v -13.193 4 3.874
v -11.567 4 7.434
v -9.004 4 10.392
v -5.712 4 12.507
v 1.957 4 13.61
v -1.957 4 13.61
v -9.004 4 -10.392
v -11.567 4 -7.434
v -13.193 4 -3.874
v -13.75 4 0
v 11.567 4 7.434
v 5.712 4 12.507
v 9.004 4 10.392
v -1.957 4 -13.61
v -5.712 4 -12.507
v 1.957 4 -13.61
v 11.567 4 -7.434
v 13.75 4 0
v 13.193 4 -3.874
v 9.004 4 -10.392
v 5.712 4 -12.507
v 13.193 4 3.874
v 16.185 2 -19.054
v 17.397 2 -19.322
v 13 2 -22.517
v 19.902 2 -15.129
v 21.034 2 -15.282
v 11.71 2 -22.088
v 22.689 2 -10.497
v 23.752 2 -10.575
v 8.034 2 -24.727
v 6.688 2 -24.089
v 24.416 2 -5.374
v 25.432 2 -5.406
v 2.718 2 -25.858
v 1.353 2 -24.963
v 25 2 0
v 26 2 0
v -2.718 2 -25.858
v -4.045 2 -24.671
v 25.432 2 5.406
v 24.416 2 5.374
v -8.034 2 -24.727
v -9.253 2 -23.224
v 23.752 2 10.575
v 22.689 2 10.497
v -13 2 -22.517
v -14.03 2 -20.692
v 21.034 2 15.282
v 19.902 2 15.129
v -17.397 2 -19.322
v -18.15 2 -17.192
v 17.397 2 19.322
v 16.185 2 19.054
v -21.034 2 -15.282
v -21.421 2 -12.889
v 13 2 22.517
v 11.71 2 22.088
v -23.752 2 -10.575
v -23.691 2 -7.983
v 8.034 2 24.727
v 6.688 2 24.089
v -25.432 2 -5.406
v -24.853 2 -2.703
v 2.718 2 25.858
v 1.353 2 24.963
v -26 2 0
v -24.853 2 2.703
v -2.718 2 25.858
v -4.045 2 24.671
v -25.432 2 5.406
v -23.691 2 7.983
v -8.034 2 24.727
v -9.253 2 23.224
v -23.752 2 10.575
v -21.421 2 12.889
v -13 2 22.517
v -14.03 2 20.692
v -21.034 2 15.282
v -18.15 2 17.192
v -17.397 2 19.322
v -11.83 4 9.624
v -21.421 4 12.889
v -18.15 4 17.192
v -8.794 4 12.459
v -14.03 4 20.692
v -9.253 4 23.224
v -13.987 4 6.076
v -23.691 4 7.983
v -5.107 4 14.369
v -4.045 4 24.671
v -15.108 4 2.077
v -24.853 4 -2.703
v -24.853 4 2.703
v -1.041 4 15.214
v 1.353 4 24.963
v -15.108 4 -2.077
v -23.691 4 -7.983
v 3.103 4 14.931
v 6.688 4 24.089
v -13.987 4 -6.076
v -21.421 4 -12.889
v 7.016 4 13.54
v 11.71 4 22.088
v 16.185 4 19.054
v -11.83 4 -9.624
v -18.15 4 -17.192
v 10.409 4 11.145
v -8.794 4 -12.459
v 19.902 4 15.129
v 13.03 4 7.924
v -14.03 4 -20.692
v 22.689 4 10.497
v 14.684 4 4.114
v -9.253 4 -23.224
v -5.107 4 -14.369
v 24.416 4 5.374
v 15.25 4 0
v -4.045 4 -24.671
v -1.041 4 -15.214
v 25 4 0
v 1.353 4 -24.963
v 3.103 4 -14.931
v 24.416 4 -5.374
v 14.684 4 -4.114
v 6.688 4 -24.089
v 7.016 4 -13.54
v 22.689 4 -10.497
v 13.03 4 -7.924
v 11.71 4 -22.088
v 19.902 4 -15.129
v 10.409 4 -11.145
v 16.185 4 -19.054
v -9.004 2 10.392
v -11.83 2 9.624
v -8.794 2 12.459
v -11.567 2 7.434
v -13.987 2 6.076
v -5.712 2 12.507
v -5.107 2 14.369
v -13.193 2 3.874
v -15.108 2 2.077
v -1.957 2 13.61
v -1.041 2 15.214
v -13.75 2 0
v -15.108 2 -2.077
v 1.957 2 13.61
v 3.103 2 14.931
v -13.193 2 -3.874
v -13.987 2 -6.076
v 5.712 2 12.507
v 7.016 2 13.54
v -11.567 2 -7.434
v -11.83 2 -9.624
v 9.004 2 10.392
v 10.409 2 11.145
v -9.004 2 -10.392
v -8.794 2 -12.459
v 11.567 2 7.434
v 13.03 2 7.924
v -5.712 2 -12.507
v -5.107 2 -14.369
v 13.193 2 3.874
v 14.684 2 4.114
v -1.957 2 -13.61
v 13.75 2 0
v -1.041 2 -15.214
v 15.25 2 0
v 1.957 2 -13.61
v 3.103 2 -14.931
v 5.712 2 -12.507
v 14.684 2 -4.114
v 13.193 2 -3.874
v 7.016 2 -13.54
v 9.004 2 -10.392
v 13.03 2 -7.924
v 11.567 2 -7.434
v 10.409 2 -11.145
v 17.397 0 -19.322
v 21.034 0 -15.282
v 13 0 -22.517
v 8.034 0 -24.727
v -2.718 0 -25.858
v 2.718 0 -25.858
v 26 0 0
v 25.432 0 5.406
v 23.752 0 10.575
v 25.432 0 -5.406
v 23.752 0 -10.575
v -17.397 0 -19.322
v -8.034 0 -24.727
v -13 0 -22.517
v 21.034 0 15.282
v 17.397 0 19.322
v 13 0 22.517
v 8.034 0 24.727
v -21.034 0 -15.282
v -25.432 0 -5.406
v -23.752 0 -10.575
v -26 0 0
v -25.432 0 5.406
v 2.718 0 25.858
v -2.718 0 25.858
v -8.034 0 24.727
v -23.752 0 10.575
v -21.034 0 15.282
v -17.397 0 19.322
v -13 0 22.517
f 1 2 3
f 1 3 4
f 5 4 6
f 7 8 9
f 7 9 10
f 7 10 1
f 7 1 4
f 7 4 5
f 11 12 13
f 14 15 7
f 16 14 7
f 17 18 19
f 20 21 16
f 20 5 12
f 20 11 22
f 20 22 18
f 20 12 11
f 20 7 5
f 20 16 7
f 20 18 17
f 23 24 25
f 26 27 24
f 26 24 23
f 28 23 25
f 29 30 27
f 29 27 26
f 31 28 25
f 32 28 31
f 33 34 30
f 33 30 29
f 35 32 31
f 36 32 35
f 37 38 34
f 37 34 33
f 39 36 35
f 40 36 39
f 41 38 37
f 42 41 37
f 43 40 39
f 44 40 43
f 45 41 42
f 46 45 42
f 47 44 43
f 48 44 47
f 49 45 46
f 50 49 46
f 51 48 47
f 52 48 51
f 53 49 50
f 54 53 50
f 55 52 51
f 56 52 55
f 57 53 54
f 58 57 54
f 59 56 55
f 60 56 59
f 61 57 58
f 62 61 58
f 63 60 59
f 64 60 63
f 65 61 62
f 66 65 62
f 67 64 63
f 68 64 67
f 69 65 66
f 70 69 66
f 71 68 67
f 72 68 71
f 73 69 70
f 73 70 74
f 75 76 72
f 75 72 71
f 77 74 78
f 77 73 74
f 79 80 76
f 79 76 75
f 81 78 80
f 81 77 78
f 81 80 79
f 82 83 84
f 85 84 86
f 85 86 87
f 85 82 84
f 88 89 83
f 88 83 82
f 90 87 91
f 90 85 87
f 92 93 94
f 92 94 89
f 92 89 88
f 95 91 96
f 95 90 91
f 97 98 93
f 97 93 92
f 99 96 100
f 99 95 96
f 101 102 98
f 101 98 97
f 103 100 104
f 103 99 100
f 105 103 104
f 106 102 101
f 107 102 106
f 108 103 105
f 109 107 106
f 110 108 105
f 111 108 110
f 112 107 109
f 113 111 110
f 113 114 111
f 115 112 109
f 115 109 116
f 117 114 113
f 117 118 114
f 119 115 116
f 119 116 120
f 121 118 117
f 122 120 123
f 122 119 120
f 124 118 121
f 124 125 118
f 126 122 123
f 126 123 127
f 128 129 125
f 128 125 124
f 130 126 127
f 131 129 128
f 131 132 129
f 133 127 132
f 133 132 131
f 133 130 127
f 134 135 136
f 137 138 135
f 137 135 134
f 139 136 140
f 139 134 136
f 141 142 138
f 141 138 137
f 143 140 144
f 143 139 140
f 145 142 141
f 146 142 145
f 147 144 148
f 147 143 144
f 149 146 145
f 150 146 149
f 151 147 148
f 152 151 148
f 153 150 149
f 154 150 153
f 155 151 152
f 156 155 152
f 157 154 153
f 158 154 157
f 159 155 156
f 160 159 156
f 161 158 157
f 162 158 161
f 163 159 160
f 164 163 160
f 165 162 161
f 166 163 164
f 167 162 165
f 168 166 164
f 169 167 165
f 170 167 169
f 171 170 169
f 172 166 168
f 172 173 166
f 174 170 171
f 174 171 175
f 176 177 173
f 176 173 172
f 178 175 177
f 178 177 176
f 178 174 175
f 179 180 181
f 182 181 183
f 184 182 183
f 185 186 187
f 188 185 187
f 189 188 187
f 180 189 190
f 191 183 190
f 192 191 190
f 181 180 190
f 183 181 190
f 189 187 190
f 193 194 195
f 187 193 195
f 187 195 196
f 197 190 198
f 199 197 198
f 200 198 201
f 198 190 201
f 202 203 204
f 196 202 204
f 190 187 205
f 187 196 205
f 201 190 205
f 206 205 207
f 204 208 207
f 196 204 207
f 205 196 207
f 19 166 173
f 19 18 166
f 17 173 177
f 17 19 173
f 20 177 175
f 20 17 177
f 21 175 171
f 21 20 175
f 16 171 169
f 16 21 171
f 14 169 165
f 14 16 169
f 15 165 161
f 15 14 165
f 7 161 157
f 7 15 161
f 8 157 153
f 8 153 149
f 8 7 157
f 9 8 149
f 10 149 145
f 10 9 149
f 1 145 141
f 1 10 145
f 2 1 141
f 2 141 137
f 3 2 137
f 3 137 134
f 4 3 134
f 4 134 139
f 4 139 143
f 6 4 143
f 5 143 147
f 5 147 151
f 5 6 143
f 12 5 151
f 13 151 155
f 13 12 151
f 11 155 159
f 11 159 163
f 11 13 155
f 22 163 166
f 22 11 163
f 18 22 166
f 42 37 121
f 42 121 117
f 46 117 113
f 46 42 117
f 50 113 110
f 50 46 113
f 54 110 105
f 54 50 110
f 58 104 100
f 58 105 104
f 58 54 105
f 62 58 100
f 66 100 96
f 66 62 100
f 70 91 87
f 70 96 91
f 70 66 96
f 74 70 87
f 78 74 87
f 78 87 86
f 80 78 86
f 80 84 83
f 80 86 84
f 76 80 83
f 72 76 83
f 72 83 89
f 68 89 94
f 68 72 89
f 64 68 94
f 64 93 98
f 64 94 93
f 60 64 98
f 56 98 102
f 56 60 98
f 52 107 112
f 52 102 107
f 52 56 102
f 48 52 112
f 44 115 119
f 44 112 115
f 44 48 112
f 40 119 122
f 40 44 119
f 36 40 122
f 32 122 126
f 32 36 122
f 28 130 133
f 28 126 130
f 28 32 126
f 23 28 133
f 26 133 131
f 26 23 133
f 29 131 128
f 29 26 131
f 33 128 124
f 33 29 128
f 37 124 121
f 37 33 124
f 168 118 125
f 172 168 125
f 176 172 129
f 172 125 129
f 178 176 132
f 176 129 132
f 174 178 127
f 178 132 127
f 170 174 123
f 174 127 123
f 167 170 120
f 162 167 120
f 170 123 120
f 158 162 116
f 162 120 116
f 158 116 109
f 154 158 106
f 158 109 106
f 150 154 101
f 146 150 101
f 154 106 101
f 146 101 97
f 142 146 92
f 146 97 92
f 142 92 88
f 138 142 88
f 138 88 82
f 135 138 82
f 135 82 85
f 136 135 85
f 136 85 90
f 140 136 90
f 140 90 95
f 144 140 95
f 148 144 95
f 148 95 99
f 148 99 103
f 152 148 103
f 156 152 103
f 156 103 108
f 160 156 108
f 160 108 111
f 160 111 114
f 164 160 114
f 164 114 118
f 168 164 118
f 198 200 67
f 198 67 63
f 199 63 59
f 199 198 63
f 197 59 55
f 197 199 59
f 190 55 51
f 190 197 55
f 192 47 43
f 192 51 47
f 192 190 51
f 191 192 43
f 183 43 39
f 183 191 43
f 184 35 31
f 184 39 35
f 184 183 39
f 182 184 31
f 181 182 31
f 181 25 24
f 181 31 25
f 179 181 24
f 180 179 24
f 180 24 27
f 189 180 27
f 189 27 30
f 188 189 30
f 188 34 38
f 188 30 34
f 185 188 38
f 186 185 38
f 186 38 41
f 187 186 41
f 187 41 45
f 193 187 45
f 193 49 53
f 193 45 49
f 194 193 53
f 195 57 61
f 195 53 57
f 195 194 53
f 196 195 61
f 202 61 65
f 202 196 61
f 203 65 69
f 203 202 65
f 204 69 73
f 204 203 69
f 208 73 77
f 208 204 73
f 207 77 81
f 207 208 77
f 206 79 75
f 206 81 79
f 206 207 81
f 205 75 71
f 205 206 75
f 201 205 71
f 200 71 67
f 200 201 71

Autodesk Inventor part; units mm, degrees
ref_plane "YZ Plane" through (0, 0, 0) normal (1, 0, 0) x (0, 1, 0)
ref_plane "XZ Plane" through (0, 0, 0) normal (0, 1, 0) x (-1, 0, 0)
ref_plane "XY Plane" through (0, 0, 0) normal (0, 0, 1) x (1, 0, 0)
sketch "Sketch1" plane through (0, 0, 0) normal (0, 1, 0) x (-1, 0, 0)
  circle A0 centre (0, 0) radius 25
  circle A1 centre (0, 0) radius 26
  dimension "d0" = 50
  dimension "d1" = 52
extrude "Extrusion1" add sketch "Sketch1" along normal blind 2 contours A0 | A1
sketch "Sketch2" plane through (0, 2, 0) normal (0, 1, 0) x (1, 0, 0)
  circle A0 centre (0, 0) radius 25
  dimension "d4" = 50
extrude "Extrusion2" add sketch "Sketch2" along normal blind 2
sketch "Sketch3" plane through (0, 4, 0) normal (0, 1, 0) x (1, 0, 0)
  circle A0 centre (0, 0) radius 13.75
  circle A1 centre (0, 0) radius 15.25
  dimension "d7" = 27.5
  dimension "d8" = 30.5
extrude "Extrusion3" cut sketch "Sketch3" against normal blind 2
properties part number "Cap"
